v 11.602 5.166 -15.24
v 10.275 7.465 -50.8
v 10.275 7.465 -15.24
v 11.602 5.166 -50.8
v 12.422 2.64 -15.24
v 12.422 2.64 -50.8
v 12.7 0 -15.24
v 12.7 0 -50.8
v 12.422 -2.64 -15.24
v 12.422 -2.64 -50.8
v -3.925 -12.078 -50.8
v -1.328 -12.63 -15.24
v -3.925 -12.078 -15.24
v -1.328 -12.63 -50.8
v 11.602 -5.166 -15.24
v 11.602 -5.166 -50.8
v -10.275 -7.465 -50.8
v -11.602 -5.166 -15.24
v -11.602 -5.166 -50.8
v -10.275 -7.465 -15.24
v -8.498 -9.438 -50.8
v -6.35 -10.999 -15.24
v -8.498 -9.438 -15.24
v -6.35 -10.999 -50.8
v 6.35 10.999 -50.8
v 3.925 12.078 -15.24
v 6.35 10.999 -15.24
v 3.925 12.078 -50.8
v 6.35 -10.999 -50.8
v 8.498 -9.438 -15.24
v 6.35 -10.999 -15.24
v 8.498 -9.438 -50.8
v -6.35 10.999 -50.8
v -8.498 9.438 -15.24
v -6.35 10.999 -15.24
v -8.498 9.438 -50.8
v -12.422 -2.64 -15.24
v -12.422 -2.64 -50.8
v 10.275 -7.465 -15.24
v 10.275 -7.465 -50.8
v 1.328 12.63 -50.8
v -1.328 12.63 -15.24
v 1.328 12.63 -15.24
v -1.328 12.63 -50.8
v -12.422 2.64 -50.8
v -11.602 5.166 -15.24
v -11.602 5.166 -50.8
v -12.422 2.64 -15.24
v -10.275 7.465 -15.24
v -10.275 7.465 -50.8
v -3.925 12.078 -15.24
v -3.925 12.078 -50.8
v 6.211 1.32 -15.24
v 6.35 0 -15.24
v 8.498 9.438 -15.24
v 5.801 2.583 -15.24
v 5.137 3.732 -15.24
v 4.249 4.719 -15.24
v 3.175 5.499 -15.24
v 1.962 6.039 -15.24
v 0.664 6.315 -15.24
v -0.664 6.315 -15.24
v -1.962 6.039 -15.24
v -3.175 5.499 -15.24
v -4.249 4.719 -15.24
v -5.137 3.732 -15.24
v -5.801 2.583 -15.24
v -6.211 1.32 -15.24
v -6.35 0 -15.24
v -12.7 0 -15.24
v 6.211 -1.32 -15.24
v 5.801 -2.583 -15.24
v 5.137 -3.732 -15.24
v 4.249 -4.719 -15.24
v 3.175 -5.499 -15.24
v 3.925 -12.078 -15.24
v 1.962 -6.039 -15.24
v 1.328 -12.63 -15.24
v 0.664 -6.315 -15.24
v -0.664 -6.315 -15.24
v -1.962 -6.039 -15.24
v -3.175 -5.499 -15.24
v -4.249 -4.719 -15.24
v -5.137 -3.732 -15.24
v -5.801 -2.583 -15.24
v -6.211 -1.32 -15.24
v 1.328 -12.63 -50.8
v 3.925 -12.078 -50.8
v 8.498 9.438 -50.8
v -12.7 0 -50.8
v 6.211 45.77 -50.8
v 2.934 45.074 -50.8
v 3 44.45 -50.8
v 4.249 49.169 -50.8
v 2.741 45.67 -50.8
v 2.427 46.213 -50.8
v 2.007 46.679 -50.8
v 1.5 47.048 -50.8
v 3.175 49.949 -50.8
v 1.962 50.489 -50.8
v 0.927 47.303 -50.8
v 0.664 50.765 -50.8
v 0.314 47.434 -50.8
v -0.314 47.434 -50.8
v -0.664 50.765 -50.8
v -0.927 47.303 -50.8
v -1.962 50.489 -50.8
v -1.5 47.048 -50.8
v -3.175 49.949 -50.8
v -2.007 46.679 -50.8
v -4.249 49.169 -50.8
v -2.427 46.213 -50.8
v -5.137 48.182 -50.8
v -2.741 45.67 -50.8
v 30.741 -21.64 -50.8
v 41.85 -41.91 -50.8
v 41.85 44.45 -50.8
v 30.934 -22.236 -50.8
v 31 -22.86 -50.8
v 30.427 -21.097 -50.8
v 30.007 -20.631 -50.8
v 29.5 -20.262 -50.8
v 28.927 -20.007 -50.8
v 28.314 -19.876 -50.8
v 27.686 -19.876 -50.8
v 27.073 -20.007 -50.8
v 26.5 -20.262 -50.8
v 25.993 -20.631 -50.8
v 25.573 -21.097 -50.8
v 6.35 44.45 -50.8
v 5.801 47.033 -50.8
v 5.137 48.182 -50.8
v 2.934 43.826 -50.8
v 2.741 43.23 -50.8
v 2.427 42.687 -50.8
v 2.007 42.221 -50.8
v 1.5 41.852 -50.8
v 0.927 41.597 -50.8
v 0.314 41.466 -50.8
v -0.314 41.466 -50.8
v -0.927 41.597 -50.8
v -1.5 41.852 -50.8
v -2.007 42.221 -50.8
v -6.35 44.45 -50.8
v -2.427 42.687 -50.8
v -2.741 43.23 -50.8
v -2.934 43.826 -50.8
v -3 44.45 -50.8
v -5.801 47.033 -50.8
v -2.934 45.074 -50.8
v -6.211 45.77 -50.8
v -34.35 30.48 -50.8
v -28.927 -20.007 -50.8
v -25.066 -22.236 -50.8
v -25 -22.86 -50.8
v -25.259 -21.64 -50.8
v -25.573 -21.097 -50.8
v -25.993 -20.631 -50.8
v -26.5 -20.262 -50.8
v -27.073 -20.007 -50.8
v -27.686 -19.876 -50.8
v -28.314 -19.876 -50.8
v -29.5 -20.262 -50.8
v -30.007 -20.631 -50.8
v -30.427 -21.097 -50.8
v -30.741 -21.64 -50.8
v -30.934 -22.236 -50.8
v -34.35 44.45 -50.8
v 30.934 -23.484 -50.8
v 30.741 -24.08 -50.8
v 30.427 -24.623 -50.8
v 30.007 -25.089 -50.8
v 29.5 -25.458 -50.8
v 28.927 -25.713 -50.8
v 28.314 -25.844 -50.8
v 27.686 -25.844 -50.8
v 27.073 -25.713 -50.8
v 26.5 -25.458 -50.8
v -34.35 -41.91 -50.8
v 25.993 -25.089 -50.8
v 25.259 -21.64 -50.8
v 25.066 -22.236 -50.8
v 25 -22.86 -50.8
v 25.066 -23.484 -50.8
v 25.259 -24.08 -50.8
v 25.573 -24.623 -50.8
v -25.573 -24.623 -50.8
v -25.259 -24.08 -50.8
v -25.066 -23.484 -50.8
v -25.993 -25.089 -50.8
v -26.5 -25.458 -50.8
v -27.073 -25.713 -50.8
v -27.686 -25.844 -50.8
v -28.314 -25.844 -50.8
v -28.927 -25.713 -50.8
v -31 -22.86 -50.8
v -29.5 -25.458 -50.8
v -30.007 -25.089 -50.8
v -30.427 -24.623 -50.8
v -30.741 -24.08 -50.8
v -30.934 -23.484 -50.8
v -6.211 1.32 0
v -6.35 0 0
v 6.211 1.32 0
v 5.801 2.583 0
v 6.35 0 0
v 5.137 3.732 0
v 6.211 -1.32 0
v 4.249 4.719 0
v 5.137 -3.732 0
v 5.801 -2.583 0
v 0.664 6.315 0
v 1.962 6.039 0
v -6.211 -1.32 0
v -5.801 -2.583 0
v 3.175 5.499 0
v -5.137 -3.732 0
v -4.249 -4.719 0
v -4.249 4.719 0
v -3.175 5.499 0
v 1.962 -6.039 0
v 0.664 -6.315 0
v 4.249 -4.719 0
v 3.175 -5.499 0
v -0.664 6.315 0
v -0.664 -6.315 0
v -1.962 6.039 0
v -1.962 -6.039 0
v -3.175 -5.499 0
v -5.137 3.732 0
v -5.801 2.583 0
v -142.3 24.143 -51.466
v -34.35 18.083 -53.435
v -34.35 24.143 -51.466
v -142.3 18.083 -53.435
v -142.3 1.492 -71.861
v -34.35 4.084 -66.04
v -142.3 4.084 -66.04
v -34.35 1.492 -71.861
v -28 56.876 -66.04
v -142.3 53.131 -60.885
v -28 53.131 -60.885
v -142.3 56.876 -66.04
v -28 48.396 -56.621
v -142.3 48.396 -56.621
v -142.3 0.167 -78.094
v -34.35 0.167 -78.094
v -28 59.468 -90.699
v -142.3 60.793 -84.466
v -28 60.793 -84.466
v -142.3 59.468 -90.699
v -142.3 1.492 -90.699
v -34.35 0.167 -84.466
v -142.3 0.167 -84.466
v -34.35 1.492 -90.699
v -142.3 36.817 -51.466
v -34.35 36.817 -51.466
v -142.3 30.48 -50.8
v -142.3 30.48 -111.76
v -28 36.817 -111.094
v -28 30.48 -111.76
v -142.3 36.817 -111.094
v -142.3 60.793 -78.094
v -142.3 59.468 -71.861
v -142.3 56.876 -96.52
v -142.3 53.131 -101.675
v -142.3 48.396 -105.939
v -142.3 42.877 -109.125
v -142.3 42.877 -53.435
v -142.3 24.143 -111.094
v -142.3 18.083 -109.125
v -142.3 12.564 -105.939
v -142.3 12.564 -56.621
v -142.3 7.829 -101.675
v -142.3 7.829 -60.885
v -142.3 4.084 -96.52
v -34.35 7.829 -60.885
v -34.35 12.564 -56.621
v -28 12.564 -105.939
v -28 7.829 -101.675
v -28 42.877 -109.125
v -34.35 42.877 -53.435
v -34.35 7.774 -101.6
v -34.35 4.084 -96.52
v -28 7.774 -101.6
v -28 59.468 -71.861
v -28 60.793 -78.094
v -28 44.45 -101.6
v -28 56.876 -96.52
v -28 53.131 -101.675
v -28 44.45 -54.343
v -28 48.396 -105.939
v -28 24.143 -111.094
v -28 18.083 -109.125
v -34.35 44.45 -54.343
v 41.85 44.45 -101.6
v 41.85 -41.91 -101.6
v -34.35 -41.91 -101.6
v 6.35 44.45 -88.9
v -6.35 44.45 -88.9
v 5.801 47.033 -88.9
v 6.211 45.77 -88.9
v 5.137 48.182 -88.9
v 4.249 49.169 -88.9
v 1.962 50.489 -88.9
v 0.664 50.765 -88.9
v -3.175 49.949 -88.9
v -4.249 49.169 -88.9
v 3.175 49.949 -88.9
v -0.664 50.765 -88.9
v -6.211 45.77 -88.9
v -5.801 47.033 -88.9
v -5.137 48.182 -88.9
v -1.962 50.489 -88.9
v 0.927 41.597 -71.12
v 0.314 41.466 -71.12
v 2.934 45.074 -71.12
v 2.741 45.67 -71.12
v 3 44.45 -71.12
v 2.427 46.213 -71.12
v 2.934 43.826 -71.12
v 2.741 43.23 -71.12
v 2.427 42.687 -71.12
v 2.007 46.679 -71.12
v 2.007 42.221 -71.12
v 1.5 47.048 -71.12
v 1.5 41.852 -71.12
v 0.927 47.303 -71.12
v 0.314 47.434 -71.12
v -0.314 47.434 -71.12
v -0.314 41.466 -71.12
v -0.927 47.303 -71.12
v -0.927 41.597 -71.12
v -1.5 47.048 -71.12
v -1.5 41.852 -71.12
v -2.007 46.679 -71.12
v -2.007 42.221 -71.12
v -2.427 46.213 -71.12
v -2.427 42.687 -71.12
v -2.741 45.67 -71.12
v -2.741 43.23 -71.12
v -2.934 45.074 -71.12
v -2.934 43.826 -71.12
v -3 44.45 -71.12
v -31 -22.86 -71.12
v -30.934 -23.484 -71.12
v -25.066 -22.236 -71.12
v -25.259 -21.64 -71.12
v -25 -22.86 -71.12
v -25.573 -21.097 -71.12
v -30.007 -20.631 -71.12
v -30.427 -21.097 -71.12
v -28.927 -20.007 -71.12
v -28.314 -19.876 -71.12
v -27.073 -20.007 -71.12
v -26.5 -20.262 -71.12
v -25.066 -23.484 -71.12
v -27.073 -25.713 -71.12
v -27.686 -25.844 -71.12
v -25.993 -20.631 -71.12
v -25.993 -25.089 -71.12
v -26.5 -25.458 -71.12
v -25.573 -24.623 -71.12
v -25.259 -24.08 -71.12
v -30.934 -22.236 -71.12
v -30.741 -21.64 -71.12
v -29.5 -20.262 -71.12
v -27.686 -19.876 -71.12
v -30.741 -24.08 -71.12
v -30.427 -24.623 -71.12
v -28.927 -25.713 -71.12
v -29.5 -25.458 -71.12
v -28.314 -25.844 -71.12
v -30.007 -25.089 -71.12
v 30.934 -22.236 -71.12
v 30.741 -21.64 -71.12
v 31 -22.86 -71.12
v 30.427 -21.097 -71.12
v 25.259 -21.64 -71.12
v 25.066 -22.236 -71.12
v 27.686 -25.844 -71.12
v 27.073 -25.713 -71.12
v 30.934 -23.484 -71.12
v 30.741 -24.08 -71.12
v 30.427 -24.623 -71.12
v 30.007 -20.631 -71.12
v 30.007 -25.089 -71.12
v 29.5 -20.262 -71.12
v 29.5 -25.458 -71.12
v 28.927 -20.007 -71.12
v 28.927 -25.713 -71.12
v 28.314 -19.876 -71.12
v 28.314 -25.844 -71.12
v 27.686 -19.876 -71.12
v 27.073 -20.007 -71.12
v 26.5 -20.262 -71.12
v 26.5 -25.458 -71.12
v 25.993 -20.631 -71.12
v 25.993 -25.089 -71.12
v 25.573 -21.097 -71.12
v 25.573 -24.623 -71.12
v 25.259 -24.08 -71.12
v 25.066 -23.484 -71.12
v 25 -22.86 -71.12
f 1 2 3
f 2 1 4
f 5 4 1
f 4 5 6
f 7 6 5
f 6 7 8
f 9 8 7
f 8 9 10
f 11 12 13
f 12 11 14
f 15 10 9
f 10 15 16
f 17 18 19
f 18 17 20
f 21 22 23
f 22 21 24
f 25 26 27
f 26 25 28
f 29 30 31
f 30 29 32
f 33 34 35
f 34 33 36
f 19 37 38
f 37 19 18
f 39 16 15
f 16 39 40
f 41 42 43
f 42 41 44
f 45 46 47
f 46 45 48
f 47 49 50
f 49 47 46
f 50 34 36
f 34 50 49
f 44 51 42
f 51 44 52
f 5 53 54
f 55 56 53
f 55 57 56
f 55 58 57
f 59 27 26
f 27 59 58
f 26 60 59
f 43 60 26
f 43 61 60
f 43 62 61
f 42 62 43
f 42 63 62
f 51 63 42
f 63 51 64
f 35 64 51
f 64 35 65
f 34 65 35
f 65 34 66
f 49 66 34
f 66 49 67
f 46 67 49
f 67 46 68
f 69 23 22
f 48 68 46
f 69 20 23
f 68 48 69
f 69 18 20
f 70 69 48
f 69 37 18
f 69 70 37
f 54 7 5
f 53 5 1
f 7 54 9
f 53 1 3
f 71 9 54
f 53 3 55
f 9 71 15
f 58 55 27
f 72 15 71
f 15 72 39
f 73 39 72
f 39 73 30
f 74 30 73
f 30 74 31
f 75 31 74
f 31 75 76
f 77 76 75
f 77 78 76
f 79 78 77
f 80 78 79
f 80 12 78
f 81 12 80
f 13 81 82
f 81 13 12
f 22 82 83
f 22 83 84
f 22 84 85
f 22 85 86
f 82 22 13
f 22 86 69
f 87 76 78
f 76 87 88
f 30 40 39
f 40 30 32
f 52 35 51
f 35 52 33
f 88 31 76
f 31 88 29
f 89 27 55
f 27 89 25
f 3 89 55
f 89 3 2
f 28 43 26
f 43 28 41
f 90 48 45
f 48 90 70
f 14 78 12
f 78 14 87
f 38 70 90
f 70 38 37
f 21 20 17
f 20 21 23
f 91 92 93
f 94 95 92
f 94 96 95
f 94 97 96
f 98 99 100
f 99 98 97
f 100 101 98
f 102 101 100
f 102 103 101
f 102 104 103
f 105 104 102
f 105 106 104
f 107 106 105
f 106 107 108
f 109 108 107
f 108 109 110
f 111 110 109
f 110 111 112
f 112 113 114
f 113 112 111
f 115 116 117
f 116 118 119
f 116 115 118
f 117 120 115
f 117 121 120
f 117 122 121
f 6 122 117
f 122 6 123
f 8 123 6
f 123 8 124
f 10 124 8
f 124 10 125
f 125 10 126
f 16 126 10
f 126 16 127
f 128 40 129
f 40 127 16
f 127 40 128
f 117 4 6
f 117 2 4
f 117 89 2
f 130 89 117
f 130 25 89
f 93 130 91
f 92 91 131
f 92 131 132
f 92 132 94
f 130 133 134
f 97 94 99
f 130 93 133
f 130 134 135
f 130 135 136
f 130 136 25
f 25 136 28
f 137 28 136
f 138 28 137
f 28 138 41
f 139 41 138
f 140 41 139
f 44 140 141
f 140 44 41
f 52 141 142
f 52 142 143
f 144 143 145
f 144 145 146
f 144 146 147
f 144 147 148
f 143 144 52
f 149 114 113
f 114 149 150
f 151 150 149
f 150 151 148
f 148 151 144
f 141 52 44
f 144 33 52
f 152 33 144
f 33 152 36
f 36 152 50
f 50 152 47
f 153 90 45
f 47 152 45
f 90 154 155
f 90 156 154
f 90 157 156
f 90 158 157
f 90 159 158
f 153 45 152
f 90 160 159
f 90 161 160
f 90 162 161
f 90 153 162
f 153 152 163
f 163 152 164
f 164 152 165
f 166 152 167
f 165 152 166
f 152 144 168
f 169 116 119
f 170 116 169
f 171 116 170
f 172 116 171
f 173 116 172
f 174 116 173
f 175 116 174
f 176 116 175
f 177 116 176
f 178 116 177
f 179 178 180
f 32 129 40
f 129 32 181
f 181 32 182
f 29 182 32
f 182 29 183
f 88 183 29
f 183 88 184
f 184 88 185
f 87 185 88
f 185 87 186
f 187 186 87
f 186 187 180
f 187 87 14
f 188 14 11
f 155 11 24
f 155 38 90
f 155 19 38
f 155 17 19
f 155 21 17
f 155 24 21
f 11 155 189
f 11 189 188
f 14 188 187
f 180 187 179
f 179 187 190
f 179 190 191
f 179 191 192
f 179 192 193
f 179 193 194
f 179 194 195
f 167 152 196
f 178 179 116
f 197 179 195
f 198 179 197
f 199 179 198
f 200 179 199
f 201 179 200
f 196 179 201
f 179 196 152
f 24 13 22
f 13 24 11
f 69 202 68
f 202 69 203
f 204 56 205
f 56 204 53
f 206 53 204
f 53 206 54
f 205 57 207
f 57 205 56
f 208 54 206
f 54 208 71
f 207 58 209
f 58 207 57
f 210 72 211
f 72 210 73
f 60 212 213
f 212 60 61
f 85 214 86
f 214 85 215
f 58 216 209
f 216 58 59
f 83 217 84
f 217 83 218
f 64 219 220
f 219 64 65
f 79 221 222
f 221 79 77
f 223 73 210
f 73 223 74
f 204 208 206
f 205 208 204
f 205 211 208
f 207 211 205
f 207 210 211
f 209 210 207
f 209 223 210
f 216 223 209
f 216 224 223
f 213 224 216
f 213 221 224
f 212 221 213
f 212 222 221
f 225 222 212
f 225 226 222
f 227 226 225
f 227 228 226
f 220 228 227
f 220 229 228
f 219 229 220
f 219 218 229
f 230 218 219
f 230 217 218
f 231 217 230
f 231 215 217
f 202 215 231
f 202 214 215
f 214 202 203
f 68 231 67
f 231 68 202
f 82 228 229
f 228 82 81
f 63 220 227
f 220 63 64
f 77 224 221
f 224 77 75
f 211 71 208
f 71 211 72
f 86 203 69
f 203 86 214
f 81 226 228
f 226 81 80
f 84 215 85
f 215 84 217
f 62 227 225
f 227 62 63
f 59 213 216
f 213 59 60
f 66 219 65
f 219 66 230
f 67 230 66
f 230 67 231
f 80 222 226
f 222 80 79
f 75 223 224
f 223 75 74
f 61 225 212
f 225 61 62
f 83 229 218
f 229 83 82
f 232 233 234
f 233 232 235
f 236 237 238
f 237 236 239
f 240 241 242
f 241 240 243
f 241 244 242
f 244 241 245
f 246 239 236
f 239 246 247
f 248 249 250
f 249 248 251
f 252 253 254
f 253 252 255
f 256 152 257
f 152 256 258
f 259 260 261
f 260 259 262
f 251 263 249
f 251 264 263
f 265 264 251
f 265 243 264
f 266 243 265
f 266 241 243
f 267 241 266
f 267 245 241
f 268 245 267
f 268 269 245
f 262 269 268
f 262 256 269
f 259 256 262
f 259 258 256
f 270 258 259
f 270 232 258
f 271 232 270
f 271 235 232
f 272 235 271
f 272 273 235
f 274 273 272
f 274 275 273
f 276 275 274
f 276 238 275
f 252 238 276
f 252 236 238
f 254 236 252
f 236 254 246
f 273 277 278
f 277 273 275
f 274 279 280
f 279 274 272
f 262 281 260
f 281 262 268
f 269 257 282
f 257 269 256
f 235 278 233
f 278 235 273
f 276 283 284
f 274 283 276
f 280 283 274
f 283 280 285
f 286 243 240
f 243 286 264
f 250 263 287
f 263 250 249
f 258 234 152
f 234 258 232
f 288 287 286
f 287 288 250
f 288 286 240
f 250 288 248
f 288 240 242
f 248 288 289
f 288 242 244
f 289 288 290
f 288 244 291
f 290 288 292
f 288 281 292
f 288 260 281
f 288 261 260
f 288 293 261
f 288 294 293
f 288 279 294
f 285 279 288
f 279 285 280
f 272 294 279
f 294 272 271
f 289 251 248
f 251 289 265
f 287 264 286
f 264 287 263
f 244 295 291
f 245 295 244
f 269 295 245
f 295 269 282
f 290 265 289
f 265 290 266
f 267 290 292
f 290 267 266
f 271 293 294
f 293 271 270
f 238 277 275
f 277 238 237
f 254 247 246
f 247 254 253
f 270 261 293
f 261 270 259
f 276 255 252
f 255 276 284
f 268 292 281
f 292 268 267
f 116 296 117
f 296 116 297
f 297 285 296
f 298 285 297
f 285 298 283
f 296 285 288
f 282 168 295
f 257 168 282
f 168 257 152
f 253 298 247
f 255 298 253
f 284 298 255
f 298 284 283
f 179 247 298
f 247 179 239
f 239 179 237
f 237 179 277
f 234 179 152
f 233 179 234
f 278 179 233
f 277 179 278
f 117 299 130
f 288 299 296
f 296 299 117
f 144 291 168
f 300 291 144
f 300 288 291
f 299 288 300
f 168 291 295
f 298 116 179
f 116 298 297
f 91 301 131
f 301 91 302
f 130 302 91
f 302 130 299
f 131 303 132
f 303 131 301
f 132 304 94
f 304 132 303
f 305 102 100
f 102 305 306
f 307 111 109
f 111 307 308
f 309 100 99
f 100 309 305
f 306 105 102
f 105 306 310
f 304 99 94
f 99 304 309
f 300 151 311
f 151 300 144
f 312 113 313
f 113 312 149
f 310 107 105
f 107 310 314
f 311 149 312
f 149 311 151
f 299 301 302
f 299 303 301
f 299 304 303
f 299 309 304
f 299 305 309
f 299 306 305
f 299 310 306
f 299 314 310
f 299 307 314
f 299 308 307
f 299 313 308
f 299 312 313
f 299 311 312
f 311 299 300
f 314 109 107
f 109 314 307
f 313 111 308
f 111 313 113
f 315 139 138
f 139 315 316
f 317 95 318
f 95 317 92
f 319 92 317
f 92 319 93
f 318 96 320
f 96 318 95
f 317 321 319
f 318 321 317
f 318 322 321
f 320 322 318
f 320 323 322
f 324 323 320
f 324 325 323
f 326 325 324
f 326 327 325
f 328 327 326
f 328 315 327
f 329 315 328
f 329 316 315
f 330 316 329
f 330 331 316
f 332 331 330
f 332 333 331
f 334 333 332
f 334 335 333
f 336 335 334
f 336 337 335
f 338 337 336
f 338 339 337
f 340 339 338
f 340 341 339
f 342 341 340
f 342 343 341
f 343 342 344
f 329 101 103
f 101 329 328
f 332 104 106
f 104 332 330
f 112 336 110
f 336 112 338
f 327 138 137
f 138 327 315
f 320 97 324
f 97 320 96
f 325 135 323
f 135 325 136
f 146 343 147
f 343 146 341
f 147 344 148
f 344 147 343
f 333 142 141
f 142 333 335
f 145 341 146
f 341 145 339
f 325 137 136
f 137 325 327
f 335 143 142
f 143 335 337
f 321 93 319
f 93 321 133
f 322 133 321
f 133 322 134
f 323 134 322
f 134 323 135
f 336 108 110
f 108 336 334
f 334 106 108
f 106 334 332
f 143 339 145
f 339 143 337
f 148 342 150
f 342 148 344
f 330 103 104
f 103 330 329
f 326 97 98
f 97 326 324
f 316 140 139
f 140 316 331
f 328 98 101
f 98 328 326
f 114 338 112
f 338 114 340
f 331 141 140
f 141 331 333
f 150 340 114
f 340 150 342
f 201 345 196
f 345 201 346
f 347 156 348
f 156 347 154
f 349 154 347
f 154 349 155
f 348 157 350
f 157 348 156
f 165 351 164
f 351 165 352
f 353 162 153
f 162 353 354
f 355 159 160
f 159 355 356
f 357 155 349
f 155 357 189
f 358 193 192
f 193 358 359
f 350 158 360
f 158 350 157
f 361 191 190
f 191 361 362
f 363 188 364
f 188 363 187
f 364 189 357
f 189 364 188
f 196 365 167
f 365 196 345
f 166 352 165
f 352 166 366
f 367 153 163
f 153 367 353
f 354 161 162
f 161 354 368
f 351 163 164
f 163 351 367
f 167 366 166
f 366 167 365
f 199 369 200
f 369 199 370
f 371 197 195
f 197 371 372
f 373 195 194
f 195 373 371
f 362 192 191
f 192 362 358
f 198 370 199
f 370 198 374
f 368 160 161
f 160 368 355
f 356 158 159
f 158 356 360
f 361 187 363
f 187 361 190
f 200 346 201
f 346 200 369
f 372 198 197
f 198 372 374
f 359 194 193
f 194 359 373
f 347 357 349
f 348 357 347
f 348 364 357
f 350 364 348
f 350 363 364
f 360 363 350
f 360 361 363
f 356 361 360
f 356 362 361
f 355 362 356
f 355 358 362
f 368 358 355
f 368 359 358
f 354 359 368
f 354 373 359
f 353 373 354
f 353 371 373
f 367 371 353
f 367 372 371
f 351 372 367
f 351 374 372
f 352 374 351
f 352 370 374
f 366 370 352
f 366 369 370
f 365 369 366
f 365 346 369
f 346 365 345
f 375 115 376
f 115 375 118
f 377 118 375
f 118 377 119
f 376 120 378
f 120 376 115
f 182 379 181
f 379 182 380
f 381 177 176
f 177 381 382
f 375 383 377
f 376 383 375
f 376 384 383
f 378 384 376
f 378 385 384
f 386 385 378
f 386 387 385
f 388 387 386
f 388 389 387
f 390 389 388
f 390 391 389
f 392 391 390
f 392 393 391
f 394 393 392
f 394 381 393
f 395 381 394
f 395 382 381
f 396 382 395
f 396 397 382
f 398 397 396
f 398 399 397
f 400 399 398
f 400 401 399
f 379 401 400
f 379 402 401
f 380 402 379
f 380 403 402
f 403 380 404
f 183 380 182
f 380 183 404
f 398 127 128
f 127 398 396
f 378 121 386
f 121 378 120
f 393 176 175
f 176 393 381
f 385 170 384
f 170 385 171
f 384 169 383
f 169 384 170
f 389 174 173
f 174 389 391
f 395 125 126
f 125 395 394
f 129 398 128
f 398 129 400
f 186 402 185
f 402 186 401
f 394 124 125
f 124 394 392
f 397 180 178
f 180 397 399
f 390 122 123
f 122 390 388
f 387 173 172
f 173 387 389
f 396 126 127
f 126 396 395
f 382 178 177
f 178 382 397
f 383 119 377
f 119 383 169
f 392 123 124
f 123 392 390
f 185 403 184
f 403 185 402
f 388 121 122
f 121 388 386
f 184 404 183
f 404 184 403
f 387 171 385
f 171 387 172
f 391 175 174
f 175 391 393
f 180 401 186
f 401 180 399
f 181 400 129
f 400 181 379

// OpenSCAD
$fn=30;
PI = 3.14159;

MM_PER_INCH = 25.4;


motor_short_c_c = 56;
motor_short_offset = 0.9 * MM_PER_INCH;
motor_long_c_c = 72;
motor_long_offset = 1.75 * MM_PER_INCH;
motor_collar_or = 1 * MM_PER_INCH / 2;
motor_hole_ir = 3;
motor_post_or = 0.5 * MM_PER_INCH / 2;
motor_hole_depth = 0.8 * MM_PER_INCH;
motor_post_depth = 1.5 * MM_PER_INCH;
motor_collar_h = 1.4 * MM_PER_INCH;
motor_post_to_sprocket_h = 2.0 * MM_PER_INCH;
motor_shaft_or = 0.5 * MM_PER_INCH / 2;
motor_or = 2.4 * MM_PER_INCH / 2;
motor_depth = 4.5 * MM_PER_INCH;
motor_gearbox_w = 3 * MM_PER_INCH;
motor_gearbox_depth = 2 * MM_PER_INCH;
motor_gearbox_l = 3.4 * MM_PER_INCH;
motor_sprocket_h = 0.3 * MM_PER_INCH;
motor_sprocket_or = 1.8 * MM_PER_INCH / 2;

function get_motor_tall_rotation() = atan(motor_short_c_c/2 / (motor_short_offset + motor_long_offset));

module motor_post() {
    // difference() {
      //  cylinder(h=motor_post_depth, r=motor_post_or);
        translate([0, 0, motor_post_depth - motor_hole_depth])
            cylinder(r=motor_hole_ir, h=motor_hole_depth);
    //}
}

module drive_motor(use_stl=false) {
    if (use_stl) {
        import("drive_motor.stl");
    } else {
        translate([0, 0, -motor_post_to_sprocket_h]) {
            difference() {
                union() {
                    cylinder(r=motor_collar_or, h=motor_collar_h);
                    cylinder(r=motor_shaft_or, h=motor_post_to_sprocket_h);
            
                    translate([-motor_short_c_c/2, motor_or, -motor_or])
                    rotate([0, -90, 0])
                        cylinder(r=motor_or, h=motor_depth);
                    translate([-motor_short_c_c/2 - motor_post_or, motor_long_offset - motor_gearbox_l, -motor_gearbox_depth])
                    cube([motor_gearbox_w, motor_gearbox_l, motor_gearbox_depth]);
                    translate([0, motor_long_offset, -motor_post_depth])
                        cylinder(h=motor_post_depth, r=motor_post_or);
                }
                translate([0, motor_long_offset, -motor_post_depth])
                    motor_post();
                translate([-motor_short_c_c/2, -motor_short_offset, -motor_post_depth])
                    motor_post();
                translate([motor_short_c_c/2, -motor_short_offset, -motor_post_depth])
                    motor_post();
            }
        }
    }
}
drive_motor(false);
